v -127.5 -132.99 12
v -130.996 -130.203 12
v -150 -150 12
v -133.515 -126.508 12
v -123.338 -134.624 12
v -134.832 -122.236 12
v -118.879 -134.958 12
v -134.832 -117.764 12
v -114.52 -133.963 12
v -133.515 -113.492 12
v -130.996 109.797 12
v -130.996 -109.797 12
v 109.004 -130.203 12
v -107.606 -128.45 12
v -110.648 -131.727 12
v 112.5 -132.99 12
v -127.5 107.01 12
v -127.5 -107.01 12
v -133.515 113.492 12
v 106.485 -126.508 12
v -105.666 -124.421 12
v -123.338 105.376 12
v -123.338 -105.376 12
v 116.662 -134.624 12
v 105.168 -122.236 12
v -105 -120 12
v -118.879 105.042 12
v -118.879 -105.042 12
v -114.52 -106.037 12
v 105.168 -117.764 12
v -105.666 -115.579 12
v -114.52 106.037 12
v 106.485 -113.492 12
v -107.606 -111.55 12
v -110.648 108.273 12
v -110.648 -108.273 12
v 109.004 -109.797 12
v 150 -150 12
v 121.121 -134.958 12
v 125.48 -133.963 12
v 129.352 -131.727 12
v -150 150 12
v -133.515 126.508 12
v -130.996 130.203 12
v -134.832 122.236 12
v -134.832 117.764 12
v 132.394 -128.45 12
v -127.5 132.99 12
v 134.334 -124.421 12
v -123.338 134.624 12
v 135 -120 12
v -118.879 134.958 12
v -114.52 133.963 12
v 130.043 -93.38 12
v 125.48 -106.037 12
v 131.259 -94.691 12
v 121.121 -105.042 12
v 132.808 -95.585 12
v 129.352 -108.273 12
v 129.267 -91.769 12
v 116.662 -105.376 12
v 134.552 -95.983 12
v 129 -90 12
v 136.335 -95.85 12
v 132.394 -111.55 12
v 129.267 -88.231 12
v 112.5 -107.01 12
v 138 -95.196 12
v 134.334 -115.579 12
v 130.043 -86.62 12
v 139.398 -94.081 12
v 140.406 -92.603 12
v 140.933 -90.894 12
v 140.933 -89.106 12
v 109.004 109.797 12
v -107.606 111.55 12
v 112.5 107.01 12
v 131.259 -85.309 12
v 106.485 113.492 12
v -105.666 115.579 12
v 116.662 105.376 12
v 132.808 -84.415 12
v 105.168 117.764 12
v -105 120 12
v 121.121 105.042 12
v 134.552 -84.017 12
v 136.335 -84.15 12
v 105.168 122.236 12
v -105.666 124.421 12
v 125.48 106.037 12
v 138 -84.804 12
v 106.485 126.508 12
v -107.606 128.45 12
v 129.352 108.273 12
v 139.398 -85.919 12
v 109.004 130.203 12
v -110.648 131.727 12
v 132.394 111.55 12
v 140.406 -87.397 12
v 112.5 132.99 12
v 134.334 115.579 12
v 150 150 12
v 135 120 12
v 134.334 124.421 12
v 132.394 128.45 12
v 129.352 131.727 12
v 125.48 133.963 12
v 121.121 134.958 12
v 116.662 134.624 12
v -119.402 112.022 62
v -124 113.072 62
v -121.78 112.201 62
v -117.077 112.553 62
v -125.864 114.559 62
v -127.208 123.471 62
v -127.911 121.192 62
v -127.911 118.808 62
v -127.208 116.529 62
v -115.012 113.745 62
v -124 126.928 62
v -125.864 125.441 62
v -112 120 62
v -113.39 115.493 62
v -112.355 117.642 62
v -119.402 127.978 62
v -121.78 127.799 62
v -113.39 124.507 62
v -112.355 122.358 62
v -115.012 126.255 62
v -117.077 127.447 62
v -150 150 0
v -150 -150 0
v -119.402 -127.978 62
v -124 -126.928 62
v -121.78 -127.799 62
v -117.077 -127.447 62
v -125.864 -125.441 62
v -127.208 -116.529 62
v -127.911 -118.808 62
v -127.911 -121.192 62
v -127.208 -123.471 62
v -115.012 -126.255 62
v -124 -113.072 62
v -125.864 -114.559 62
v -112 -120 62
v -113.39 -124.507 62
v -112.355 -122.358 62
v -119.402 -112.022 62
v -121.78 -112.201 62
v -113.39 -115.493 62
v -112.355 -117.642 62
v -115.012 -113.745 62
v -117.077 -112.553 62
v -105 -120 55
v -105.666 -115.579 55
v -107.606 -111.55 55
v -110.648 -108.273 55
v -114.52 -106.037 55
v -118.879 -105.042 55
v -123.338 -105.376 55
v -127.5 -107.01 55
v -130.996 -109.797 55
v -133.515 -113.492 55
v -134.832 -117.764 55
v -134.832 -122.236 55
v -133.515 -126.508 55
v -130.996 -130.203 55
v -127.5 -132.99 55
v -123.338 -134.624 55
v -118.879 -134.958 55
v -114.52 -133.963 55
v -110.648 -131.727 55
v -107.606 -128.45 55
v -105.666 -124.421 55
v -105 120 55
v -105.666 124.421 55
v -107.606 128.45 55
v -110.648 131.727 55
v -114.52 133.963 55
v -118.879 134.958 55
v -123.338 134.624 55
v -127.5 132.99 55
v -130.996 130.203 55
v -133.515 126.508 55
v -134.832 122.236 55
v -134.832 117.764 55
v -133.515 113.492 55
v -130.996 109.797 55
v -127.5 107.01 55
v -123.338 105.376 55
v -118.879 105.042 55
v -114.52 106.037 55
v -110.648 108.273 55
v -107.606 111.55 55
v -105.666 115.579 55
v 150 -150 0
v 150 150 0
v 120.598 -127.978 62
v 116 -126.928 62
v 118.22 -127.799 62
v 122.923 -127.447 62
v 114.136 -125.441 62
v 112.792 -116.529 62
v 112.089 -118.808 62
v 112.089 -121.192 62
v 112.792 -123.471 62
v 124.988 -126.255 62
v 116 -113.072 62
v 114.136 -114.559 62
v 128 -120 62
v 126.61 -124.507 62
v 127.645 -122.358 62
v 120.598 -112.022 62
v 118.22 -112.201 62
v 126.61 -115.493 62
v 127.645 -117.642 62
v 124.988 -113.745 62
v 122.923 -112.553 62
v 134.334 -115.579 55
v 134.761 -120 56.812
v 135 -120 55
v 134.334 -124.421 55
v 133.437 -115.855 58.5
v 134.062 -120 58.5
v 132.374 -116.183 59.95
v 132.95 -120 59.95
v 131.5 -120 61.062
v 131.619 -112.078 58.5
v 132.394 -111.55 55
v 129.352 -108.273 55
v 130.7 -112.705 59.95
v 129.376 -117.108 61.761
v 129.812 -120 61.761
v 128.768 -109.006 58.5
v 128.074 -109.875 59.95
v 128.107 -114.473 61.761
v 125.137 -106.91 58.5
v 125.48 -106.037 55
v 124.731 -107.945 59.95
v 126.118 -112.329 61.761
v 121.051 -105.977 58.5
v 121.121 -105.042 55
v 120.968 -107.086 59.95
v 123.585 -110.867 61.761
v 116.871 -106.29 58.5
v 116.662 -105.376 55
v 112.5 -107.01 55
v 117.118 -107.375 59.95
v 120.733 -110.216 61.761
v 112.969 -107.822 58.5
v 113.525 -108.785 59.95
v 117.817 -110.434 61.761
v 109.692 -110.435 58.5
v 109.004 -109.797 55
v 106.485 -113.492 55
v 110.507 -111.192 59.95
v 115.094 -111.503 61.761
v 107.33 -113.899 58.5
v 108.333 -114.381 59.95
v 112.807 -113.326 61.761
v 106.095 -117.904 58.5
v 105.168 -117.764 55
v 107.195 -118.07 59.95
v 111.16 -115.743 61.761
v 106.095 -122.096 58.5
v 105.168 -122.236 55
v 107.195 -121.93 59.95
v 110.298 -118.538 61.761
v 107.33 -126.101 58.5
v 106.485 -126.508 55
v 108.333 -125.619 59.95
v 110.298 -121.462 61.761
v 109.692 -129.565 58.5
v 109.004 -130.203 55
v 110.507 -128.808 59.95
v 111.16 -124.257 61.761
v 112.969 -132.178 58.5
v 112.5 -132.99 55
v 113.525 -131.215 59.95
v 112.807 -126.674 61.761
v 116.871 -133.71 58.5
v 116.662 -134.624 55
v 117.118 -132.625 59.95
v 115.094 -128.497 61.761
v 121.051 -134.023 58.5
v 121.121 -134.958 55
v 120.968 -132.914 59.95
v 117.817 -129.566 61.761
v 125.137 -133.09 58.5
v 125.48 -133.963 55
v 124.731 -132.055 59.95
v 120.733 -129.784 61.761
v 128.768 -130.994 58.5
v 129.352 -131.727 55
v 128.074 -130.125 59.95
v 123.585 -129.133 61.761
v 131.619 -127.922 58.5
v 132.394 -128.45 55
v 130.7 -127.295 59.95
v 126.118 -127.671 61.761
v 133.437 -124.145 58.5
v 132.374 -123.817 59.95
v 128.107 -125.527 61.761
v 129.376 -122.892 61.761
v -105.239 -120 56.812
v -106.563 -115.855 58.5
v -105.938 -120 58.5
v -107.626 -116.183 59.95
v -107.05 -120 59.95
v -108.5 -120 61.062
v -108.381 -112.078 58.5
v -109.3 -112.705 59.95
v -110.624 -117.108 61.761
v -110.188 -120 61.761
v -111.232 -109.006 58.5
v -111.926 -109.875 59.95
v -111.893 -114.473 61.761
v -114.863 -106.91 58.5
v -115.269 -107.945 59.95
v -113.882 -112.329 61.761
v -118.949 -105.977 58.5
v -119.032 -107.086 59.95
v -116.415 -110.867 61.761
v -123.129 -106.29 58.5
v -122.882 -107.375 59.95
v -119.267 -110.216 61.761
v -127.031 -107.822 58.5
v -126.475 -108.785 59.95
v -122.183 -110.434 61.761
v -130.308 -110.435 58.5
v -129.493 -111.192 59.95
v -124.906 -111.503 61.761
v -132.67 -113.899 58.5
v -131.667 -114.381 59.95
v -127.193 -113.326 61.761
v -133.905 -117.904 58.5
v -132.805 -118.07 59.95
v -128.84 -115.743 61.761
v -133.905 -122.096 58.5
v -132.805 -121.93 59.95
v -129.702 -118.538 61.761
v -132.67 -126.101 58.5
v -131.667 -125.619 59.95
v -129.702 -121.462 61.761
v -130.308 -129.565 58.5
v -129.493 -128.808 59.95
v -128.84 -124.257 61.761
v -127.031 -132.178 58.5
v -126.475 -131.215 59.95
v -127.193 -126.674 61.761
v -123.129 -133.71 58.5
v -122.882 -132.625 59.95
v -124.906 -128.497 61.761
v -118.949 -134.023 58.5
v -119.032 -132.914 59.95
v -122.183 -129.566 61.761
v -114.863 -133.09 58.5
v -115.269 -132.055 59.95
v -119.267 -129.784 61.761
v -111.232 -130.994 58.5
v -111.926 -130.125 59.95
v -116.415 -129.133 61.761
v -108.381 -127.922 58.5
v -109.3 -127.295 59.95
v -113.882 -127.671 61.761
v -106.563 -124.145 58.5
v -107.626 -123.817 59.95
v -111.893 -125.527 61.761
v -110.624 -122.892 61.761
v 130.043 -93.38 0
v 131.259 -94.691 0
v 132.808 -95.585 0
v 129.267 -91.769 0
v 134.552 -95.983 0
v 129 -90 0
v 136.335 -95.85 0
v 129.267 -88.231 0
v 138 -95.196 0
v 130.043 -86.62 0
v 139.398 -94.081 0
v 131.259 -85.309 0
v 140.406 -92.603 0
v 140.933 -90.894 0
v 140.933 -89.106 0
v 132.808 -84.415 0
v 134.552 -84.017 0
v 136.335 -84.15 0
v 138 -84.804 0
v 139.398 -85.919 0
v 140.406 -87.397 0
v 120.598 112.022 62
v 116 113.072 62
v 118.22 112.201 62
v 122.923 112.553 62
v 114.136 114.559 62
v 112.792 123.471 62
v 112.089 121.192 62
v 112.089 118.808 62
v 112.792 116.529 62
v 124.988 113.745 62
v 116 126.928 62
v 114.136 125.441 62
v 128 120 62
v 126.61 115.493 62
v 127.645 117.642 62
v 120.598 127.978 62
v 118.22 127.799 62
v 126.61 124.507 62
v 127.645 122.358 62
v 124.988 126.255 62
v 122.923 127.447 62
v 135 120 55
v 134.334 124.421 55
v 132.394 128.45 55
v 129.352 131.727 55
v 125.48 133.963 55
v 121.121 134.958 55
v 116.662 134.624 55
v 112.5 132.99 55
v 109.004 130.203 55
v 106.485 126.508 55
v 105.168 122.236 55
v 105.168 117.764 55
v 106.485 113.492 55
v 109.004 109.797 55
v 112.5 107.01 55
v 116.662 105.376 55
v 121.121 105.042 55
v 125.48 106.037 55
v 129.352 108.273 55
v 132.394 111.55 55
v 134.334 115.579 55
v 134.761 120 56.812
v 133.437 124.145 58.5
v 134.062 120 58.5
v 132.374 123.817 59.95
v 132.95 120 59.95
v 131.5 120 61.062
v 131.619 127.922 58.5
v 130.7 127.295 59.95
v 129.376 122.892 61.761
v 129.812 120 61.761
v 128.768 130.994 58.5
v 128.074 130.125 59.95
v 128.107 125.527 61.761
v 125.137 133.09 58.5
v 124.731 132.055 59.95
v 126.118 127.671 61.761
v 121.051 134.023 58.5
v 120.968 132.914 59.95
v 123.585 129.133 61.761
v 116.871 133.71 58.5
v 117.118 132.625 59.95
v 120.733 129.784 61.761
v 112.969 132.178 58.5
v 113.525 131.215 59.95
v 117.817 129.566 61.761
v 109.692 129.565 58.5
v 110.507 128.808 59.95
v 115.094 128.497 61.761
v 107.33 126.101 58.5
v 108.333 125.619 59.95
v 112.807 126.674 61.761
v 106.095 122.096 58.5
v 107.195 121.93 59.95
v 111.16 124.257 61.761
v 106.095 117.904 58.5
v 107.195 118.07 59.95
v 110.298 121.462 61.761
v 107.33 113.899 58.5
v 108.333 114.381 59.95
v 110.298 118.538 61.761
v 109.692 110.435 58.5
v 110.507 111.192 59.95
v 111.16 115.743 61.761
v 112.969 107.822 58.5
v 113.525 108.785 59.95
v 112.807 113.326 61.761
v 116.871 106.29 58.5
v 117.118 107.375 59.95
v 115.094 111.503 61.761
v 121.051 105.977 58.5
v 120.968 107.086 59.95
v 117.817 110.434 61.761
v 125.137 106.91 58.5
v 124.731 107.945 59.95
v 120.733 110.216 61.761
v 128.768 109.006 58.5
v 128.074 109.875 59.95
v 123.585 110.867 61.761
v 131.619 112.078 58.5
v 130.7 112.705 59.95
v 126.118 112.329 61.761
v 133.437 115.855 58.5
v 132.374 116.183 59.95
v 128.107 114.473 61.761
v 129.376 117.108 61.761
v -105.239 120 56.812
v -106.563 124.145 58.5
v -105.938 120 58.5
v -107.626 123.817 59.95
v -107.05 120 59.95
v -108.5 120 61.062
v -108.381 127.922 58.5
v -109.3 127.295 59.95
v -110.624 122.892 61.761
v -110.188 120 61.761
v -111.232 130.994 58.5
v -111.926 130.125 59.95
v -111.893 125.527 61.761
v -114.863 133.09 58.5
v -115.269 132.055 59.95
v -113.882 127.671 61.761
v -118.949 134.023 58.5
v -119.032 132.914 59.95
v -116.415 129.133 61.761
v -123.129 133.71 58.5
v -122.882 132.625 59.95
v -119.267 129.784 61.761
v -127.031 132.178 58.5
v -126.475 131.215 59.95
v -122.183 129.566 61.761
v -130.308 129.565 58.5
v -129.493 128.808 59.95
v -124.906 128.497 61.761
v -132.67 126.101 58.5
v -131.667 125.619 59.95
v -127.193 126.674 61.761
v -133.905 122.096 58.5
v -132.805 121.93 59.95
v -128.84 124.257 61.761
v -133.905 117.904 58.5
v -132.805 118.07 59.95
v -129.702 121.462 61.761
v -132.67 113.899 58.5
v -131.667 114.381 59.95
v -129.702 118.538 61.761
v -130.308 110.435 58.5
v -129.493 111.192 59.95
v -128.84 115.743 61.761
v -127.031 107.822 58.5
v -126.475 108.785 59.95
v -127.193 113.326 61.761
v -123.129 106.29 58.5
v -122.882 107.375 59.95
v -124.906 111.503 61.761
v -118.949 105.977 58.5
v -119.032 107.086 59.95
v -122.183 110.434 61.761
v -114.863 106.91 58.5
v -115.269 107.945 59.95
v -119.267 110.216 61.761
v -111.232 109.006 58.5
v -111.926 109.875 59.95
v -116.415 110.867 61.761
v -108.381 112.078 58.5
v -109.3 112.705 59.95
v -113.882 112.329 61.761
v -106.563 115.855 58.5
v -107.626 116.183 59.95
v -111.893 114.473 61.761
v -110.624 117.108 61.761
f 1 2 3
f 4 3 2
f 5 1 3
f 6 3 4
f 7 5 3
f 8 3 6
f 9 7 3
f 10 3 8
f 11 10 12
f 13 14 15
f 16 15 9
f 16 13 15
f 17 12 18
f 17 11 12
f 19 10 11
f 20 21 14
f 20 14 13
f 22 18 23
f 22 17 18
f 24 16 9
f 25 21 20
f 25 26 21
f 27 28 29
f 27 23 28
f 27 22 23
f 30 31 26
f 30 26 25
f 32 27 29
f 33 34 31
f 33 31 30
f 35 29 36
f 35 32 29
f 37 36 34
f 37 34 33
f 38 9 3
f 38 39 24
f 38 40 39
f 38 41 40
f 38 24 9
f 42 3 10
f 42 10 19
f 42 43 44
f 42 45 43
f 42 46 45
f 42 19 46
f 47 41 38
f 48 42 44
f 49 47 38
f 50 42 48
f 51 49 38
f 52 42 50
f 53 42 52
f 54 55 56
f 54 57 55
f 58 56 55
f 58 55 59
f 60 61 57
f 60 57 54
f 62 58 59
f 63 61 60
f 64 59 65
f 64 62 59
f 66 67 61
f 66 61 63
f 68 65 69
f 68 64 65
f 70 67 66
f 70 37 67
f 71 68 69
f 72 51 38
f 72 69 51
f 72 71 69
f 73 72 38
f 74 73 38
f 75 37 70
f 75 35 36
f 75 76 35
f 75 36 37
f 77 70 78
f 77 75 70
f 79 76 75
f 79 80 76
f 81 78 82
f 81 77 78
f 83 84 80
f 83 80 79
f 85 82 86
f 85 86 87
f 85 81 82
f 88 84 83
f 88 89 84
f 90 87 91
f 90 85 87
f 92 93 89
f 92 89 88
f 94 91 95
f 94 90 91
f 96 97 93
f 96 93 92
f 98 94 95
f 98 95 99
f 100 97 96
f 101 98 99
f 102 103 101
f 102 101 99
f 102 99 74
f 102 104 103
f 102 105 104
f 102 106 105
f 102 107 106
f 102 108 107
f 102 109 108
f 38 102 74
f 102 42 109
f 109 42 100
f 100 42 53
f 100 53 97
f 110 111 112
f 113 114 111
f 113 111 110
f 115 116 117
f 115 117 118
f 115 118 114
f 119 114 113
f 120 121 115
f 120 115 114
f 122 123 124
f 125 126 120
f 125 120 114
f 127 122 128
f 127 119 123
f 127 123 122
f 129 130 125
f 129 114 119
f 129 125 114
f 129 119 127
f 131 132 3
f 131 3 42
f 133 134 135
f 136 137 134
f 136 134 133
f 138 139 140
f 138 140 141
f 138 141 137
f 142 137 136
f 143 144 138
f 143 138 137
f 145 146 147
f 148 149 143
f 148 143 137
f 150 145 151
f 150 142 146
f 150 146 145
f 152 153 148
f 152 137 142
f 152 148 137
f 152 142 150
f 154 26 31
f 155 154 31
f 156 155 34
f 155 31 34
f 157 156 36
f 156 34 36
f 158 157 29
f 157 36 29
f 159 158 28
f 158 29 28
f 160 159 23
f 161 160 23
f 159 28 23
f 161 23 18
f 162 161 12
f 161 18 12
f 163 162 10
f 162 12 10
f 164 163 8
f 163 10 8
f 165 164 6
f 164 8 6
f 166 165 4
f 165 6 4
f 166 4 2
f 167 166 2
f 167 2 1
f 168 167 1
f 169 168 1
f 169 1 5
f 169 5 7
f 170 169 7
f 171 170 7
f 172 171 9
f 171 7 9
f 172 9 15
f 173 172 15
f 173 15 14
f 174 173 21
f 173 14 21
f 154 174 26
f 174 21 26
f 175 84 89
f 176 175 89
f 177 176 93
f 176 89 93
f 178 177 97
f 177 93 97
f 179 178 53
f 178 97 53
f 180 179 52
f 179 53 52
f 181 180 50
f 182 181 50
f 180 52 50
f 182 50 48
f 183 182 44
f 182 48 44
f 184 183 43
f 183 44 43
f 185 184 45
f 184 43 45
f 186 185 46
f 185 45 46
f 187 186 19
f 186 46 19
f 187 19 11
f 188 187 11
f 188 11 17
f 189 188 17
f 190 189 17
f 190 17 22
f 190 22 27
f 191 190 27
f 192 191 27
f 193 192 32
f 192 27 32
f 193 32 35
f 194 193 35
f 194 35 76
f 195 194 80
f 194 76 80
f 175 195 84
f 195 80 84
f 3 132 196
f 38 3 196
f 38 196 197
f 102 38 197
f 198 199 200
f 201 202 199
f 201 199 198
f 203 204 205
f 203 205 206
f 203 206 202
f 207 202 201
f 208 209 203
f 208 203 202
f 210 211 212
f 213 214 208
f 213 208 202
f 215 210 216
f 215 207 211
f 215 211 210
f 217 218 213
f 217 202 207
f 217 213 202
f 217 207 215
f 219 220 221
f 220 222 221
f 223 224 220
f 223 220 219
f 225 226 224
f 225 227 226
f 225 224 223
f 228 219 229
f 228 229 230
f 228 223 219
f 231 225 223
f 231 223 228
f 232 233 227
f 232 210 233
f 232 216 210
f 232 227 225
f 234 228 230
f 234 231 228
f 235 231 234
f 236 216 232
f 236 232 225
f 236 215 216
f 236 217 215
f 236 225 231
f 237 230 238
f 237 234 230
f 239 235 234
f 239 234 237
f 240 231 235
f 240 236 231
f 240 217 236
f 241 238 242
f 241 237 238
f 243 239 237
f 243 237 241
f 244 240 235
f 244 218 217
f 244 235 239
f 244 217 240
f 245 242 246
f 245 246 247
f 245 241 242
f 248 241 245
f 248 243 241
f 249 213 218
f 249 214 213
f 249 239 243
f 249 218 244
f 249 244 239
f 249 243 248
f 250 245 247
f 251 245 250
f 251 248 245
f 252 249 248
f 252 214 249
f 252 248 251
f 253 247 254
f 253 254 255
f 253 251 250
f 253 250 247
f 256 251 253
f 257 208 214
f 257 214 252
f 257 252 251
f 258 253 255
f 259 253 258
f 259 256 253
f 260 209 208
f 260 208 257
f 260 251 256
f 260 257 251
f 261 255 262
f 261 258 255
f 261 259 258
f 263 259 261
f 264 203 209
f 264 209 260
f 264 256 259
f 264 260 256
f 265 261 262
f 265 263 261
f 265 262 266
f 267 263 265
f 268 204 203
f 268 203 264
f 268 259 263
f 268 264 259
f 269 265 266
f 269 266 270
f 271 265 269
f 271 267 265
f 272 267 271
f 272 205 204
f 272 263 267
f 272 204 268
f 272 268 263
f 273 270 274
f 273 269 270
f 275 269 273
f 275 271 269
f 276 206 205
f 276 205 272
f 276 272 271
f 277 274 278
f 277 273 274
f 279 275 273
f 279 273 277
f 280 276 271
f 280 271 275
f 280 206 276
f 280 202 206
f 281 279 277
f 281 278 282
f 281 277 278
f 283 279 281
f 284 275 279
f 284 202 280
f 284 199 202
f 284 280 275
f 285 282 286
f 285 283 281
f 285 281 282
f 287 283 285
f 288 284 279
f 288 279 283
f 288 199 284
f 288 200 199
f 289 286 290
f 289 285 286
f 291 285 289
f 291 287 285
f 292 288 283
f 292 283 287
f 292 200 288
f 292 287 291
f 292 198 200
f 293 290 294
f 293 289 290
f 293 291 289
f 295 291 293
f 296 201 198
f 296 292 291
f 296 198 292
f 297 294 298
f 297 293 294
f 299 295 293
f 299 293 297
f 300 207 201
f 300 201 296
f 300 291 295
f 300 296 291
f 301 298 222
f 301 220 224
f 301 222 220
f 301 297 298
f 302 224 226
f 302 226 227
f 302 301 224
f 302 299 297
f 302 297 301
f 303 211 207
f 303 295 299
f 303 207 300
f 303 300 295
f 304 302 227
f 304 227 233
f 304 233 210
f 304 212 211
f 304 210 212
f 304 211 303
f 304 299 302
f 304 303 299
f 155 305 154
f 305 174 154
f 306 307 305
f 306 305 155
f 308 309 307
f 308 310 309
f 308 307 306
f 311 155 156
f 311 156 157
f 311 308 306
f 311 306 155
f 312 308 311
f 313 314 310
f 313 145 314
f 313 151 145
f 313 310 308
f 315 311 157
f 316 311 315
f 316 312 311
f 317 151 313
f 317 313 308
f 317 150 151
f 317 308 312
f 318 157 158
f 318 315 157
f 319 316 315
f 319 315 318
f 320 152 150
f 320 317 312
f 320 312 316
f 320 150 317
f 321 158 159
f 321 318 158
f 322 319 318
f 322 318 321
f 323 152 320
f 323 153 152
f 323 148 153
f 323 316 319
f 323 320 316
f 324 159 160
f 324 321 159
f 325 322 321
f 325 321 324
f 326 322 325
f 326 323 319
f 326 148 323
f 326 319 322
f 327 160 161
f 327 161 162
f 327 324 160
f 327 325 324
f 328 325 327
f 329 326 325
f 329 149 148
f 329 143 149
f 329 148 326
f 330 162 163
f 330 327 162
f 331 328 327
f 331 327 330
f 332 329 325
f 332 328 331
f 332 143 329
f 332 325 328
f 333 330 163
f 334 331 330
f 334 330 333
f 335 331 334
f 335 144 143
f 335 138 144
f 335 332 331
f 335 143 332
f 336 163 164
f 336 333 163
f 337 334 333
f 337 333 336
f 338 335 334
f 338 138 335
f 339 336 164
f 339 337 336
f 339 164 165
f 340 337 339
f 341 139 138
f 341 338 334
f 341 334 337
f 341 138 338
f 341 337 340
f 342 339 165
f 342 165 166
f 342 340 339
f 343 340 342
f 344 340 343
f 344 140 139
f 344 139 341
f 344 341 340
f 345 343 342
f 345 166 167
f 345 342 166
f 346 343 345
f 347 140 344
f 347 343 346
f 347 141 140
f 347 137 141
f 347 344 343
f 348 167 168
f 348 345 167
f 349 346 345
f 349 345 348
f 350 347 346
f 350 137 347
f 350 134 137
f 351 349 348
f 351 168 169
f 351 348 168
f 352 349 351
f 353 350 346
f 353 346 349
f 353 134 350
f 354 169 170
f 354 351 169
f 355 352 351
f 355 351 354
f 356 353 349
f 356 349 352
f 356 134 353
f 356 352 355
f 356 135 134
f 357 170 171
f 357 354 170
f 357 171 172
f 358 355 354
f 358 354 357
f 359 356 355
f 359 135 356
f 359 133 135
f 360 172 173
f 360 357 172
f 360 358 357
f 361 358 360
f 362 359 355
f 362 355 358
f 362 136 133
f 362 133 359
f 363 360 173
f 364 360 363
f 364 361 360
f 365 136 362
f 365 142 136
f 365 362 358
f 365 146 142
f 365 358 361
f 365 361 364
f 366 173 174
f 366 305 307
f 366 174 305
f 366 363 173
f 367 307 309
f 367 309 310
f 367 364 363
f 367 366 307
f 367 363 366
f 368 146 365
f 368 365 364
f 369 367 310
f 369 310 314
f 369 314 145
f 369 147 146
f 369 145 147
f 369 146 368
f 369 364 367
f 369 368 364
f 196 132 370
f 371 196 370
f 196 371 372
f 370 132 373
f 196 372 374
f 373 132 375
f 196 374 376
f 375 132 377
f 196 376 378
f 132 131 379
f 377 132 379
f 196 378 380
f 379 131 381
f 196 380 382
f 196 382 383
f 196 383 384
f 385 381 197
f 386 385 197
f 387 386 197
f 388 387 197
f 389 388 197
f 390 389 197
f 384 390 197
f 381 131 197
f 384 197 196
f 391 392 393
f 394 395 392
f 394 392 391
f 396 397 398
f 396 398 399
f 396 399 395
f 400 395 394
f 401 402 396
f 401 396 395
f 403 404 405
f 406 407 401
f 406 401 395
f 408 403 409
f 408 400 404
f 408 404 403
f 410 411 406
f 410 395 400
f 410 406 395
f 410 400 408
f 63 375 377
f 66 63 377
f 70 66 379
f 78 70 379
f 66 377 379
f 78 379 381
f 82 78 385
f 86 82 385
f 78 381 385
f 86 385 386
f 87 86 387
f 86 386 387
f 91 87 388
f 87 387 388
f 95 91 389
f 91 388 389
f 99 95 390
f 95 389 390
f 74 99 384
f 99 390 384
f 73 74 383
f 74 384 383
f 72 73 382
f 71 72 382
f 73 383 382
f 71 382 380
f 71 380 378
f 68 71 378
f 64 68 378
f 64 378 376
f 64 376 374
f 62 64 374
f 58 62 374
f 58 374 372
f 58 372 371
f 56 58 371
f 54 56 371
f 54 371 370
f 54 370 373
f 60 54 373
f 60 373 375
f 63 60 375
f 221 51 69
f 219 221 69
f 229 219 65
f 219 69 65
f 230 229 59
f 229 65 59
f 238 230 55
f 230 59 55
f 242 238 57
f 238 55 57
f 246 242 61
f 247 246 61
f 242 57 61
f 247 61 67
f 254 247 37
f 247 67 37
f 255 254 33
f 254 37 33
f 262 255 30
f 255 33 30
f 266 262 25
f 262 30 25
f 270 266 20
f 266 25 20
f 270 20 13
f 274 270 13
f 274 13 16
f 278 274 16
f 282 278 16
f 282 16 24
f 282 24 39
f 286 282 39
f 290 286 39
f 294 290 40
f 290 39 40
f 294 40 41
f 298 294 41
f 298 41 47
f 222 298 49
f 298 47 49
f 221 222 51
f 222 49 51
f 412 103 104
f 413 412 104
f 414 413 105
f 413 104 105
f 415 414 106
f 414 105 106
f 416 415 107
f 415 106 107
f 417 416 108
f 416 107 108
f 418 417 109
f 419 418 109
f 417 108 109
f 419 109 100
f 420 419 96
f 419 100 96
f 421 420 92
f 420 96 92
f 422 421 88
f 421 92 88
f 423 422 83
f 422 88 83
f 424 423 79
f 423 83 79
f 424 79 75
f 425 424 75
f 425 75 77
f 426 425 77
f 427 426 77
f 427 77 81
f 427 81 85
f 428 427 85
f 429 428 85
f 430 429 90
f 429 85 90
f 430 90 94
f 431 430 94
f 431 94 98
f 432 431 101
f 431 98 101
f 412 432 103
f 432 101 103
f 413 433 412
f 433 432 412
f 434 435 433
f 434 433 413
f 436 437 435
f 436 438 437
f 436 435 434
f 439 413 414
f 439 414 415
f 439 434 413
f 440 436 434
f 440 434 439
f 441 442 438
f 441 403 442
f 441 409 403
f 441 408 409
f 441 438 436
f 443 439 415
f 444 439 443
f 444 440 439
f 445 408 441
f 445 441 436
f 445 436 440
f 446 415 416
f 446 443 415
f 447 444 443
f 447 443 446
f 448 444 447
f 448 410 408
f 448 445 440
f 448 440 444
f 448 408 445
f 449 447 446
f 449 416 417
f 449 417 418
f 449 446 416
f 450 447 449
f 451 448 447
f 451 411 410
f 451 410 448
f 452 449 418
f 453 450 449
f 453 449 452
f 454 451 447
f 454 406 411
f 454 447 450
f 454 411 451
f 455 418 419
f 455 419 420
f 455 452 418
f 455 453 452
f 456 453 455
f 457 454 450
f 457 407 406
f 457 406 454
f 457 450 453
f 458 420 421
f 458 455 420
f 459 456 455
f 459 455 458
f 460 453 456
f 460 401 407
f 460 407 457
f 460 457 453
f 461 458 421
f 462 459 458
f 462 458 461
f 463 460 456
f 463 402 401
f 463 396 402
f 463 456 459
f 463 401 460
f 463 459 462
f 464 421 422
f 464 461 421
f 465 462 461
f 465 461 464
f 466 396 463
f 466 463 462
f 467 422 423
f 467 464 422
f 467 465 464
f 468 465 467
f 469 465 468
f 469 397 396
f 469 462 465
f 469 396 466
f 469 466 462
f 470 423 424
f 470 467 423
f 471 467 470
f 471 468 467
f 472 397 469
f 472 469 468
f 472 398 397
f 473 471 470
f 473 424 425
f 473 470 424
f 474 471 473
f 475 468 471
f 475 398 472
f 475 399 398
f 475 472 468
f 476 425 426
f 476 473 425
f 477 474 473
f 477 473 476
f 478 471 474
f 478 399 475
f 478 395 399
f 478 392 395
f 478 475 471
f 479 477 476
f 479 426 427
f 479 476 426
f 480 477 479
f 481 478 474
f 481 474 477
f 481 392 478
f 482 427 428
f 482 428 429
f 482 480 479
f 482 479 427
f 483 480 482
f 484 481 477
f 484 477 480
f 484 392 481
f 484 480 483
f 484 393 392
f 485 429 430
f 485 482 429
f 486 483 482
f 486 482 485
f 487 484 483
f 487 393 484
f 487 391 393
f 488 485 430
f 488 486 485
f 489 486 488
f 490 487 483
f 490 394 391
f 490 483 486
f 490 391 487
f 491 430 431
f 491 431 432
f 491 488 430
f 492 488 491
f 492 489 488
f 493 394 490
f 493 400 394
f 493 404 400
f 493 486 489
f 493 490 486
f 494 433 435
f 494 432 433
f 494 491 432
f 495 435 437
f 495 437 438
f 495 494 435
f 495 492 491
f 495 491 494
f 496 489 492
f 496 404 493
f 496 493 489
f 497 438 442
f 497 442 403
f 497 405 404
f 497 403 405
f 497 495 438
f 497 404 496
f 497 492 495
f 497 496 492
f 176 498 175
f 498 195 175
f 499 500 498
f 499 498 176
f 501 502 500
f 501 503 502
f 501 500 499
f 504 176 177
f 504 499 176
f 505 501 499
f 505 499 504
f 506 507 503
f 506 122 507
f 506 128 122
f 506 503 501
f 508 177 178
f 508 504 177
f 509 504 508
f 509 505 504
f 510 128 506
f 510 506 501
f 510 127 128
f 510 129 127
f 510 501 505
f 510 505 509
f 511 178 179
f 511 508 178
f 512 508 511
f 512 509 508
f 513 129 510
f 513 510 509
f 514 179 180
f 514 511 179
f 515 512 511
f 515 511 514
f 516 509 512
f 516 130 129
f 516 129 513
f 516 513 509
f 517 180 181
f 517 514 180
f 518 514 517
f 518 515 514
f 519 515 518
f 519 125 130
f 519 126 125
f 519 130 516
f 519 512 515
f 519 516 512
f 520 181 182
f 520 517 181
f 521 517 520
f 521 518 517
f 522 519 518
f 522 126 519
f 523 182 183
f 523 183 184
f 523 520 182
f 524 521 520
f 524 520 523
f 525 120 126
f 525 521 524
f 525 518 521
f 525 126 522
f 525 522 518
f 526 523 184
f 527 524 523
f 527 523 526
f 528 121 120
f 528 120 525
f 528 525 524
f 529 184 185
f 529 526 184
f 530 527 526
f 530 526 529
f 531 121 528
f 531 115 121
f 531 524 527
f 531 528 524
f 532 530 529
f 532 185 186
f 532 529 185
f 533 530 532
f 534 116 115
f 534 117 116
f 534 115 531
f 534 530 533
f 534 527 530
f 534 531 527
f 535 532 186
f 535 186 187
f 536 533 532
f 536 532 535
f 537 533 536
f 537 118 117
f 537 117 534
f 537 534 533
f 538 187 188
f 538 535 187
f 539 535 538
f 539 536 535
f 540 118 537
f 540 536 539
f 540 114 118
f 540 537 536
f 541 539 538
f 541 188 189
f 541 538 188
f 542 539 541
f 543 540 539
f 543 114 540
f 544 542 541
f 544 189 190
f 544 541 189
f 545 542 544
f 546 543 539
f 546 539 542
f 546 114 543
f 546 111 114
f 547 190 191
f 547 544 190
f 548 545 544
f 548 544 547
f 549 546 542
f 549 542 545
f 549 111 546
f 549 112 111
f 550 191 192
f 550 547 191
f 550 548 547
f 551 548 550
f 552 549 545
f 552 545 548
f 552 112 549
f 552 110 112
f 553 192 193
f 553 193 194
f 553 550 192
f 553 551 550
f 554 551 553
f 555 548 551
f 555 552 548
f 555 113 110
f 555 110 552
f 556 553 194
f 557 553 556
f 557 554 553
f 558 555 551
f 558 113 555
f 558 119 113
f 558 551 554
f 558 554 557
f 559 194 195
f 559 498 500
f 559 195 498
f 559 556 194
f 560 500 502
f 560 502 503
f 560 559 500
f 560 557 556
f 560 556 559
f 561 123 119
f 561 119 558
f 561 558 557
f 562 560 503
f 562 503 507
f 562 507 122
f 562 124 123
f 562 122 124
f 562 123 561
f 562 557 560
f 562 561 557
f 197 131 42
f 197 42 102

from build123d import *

# Parameters (mm, degrees)
SKETCH2_W                  = 300
SKETCH2_H                  = 300
BOSS_EXTRUDE1_DEPTH        = 12
SKETCH3_R                  = 15
BOSS_EXTRUDE2_DEPTH        = 50
FILLET1_R                  = 7
F_12_0_12_DIAMETER_HOLE1_D = 12


with BuildPart() as part:
    # Sketch2 → Boss-Extrude1 (new body)
    with BuildSketch(Plane.XY):
        Rectangle(SKETCH2_W, SKETCH2_H)
    extrude(amount=BOSS_EXTRUDE1_DEPTH)

    # Sketch3 → Boss-Extrude2 (add)
    with BuildSketch(Plane.XY.offset(12)):
        with Locations((120, -120)):
            Circle(SKETCH3_R)
        with Locations((-120, -120)):
            Circle(SKETCH3_R)
        with Locations((-120, 120)):
            Circle(SKETCH3_R)
        with Locations((120, 120)):
            Circle(SKETCH3_R)
    extrude(amount=BOSS_EXTRUDE2_DEPTH)

    # Fillet1
    fillet1_edges = [part.edges().sort_by_distance(p)[0] for p in [
        (-135, -120, 62),
        (105, -120, 62),
        (-135, 120, 62),
        (105, 120, 62),
    ]]
    fillet(fillet1_edges, radius=FILLET1_R)

    # Ø12.0 (12) Diameter Hole1 (through all)
    with Locations(Plane.XY.offset(12)):
        with Locations((135, -90)):
            Hole(F_12_0_12_DIAMETER_HOLE1_D / 2)


solid = part.part
